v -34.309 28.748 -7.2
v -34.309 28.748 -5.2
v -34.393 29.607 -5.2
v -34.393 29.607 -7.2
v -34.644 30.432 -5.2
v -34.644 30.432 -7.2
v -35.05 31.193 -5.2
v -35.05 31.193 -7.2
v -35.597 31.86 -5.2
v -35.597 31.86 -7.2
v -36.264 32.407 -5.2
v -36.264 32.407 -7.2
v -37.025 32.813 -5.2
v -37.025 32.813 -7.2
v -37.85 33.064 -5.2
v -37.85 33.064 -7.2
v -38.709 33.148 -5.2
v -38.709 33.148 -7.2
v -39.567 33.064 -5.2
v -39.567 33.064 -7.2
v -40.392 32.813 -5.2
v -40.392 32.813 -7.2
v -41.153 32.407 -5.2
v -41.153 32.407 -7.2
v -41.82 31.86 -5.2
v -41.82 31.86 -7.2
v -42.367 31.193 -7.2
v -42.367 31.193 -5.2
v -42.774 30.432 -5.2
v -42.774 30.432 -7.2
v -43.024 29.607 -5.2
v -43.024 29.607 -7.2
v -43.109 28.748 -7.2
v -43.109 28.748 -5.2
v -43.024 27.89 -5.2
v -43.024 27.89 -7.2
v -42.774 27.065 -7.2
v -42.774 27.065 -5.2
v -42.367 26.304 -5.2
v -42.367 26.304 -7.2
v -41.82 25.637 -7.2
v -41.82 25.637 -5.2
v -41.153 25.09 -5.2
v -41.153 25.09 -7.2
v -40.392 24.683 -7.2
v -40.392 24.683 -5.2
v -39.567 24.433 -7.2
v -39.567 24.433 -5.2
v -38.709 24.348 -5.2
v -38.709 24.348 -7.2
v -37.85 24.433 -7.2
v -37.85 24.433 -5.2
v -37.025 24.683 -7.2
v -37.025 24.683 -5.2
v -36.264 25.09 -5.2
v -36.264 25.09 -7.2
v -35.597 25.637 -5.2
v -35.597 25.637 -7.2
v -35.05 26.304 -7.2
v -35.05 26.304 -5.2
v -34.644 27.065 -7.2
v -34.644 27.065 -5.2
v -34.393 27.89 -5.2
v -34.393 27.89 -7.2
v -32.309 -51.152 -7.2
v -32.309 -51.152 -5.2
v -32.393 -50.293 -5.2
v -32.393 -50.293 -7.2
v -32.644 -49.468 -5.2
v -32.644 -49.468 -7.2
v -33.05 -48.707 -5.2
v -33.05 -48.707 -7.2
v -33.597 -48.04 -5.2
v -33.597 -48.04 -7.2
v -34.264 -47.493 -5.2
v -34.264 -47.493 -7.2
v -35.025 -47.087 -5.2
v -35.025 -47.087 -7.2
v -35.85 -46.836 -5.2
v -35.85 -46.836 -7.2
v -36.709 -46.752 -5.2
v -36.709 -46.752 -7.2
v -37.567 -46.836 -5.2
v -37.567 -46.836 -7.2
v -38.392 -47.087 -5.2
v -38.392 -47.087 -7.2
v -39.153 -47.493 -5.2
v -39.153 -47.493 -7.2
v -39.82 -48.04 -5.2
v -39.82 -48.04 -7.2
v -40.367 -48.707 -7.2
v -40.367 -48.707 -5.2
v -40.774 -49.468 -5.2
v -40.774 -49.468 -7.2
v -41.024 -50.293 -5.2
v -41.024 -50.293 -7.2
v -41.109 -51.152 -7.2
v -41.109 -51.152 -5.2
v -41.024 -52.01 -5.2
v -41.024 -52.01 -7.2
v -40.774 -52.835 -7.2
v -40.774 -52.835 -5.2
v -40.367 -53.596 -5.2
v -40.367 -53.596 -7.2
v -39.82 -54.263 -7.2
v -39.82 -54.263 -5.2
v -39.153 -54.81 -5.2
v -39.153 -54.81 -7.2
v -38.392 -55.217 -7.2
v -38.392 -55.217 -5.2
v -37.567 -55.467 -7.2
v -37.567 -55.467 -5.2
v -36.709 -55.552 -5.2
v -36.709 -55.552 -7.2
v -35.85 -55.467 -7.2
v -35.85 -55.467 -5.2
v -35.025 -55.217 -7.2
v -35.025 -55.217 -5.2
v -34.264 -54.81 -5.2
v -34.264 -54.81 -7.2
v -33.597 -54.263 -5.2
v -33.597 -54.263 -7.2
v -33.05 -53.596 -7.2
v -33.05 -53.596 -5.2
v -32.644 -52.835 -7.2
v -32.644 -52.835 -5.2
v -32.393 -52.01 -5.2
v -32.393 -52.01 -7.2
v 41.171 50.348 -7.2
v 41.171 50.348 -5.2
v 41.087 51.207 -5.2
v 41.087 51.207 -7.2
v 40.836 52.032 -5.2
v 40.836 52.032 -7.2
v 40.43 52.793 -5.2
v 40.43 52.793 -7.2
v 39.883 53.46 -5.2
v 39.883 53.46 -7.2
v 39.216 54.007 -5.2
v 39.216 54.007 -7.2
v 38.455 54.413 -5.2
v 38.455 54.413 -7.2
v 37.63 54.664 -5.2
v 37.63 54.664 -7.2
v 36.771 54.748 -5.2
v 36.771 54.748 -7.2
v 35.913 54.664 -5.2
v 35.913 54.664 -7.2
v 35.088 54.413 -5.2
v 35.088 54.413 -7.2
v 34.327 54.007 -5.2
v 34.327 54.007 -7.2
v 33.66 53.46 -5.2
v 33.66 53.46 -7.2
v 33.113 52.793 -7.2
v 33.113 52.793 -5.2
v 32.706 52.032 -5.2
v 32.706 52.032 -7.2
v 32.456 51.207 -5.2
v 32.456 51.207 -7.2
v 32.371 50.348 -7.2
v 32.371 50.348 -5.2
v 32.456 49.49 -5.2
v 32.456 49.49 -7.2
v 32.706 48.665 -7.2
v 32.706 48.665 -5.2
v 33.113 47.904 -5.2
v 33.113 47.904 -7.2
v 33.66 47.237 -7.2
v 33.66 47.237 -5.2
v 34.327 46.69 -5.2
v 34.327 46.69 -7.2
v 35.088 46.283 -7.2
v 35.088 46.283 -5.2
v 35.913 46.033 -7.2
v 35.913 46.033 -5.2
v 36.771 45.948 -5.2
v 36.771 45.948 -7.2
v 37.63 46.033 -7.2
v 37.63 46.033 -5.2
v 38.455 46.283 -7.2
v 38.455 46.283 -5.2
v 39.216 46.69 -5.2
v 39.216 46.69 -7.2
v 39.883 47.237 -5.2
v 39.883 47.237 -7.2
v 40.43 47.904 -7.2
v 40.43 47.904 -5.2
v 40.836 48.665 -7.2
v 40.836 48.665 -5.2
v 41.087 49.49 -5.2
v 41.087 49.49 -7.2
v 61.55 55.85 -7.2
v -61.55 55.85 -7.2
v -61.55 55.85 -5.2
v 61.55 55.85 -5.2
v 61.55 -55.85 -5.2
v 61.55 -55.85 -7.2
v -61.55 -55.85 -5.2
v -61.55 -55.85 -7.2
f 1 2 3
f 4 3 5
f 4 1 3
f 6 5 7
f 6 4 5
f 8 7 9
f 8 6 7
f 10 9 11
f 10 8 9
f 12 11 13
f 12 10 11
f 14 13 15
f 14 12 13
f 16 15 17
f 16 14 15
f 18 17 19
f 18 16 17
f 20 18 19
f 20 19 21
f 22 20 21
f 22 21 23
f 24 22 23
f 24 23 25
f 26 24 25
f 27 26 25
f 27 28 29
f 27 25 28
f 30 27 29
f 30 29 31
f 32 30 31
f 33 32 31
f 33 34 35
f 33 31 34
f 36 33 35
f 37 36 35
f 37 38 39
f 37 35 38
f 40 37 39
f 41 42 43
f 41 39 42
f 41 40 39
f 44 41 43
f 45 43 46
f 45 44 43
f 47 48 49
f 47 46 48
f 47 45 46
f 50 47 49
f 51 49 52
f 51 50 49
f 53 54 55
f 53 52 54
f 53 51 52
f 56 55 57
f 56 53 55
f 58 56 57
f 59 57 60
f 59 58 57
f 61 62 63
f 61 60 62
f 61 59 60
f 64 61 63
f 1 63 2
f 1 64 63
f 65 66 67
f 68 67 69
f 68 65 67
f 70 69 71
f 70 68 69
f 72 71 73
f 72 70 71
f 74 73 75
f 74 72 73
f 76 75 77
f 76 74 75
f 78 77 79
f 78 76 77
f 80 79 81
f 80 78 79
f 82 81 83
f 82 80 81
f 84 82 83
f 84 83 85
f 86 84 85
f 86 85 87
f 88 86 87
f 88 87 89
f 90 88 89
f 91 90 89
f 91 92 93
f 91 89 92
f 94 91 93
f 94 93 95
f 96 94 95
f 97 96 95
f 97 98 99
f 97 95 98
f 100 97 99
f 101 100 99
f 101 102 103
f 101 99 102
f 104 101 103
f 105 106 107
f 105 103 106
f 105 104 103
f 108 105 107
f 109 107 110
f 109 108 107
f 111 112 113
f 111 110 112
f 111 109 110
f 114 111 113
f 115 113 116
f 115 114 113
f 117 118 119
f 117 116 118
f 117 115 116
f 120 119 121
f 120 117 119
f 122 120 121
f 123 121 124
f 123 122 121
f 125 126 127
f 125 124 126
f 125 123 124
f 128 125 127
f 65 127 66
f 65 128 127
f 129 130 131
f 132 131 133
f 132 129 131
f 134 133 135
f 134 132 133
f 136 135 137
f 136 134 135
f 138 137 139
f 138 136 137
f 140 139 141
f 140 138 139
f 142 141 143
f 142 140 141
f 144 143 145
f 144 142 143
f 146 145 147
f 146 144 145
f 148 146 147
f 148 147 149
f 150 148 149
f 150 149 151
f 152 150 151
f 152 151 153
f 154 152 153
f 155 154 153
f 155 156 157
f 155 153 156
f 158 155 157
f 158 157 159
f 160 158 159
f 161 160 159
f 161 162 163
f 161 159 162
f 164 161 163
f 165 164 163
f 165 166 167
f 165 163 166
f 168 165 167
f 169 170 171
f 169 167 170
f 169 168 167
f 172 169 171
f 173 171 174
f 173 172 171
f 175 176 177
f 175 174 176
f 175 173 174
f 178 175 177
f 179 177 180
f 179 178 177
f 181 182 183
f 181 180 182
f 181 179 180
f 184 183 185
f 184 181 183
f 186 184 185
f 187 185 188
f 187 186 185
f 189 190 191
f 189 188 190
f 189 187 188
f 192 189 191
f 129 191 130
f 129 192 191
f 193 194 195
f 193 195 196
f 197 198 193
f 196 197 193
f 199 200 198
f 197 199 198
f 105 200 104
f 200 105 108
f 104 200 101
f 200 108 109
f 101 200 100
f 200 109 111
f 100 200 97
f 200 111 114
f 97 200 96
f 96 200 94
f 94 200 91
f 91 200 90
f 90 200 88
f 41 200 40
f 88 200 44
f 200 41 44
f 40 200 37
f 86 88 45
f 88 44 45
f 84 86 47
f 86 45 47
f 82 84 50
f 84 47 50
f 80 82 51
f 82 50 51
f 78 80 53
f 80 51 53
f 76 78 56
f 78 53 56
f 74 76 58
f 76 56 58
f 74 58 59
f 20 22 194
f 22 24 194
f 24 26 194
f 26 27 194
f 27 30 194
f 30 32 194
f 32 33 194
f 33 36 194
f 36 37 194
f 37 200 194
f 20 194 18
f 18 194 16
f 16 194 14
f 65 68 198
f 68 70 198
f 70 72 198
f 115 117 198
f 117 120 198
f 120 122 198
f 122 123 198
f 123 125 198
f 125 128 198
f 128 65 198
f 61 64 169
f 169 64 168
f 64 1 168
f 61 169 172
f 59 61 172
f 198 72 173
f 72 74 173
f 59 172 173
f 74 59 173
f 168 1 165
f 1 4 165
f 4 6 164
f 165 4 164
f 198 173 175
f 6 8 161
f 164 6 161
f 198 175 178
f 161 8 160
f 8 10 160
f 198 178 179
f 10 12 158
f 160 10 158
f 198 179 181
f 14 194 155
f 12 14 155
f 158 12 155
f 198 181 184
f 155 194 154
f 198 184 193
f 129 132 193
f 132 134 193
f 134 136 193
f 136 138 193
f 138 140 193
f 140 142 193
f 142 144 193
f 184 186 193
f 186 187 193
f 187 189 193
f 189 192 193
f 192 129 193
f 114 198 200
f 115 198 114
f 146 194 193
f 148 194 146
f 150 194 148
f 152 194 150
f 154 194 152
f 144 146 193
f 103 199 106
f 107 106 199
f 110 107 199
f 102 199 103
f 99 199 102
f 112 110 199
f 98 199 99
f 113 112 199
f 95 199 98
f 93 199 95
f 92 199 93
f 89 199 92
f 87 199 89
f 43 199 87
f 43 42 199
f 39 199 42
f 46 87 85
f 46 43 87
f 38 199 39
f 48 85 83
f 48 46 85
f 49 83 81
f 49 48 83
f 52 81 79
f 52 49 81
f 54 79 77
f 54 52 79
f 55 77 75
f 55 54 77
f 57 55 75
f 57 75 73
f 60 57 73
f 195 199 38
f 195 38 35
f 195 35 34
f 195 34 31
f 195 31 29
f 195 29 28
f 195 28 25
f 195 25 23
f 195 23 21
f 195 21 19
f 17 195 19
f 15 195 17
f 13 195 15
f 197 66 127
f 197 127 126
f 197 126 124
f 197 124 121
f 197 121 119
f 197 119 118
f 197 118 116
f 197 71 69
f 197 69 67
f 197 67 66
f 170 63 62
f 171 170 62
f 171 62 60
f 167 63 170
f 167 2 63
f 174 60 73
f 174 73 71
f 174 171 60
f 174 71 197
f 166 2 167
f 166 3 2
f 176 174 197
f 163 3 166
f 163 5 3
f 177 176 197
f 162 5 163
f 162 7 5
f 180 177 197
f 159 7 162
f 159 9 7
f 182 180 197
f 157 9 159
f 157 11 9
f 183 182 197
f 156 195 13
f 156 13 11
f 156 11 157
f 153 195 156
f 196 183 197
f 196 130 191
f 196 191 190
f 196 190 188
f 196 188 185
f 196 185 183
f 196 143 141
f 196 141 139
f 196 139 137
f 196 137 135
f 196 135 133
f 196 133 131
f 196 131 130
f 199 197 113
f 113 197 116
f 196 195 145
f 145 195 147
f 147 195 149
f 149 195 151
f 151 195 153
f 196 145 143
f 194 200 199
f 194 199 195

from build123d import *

# Parameters (mm, degrees)
SKETCH015_W     = 123.1
SKETCH015_H     = 111.7
PAD003_DEPTH    = 2
SKETCH020_R     = 4.4
POCKET010_DEPTH = 2.2
SKETCH021_R     = 4.4
POCKET011_DEPTH = 5.71
SKETCH022_R     = 4.4
POCKET012_DEPTH = 5.71


with BuildPart() as part:
    # Sketch015 → Pad003 (new body)
    with BuildSketch(Plane.XY.offset(-7.2)):
        Rectangle(SKETCH015_W, SKETCH015_H)
    extrude(amount=PAD003_DEPTH)

    # Sketch020 → Pocket010 (cut)
    with BuildSketch(Plane.XY.offset(-7.2)):
        with Locations((-36.708672, -51.151615)):
            Circle(SKETCH020_R)
    extrude(amount=POCKET010_DEPTH, mode=Mode.SUBTRACT)

    # Sketch021 → Pocket011 (cut)
    with BuildSketch(Plane(origin=(-2, 79.9, -7.2), x_dir=(1, 0, 0), z_dir=(0, 0, 1))):
        with Locations((-36.708672, -51.151615)):
            Circle(SKETCH021_R)
    extrude(amount=POCKET011_DEPTH, mode=Mode.SUBTRACT)

    # Sketch022 → Pocket012 (cut)
    with BuildSketch(Plane(origin=(73.48, 101.5, -7.2), x_dir=(1, 0, 0), z_dir=(0, 0, 1))):
        with Locations((-36.708672, -51.151615)):
            Circle(SKETCH022_R)
    extrude(amount=POCKET012_DEPTH, mode=Mode.SUBTRACT)


solid = part.part
